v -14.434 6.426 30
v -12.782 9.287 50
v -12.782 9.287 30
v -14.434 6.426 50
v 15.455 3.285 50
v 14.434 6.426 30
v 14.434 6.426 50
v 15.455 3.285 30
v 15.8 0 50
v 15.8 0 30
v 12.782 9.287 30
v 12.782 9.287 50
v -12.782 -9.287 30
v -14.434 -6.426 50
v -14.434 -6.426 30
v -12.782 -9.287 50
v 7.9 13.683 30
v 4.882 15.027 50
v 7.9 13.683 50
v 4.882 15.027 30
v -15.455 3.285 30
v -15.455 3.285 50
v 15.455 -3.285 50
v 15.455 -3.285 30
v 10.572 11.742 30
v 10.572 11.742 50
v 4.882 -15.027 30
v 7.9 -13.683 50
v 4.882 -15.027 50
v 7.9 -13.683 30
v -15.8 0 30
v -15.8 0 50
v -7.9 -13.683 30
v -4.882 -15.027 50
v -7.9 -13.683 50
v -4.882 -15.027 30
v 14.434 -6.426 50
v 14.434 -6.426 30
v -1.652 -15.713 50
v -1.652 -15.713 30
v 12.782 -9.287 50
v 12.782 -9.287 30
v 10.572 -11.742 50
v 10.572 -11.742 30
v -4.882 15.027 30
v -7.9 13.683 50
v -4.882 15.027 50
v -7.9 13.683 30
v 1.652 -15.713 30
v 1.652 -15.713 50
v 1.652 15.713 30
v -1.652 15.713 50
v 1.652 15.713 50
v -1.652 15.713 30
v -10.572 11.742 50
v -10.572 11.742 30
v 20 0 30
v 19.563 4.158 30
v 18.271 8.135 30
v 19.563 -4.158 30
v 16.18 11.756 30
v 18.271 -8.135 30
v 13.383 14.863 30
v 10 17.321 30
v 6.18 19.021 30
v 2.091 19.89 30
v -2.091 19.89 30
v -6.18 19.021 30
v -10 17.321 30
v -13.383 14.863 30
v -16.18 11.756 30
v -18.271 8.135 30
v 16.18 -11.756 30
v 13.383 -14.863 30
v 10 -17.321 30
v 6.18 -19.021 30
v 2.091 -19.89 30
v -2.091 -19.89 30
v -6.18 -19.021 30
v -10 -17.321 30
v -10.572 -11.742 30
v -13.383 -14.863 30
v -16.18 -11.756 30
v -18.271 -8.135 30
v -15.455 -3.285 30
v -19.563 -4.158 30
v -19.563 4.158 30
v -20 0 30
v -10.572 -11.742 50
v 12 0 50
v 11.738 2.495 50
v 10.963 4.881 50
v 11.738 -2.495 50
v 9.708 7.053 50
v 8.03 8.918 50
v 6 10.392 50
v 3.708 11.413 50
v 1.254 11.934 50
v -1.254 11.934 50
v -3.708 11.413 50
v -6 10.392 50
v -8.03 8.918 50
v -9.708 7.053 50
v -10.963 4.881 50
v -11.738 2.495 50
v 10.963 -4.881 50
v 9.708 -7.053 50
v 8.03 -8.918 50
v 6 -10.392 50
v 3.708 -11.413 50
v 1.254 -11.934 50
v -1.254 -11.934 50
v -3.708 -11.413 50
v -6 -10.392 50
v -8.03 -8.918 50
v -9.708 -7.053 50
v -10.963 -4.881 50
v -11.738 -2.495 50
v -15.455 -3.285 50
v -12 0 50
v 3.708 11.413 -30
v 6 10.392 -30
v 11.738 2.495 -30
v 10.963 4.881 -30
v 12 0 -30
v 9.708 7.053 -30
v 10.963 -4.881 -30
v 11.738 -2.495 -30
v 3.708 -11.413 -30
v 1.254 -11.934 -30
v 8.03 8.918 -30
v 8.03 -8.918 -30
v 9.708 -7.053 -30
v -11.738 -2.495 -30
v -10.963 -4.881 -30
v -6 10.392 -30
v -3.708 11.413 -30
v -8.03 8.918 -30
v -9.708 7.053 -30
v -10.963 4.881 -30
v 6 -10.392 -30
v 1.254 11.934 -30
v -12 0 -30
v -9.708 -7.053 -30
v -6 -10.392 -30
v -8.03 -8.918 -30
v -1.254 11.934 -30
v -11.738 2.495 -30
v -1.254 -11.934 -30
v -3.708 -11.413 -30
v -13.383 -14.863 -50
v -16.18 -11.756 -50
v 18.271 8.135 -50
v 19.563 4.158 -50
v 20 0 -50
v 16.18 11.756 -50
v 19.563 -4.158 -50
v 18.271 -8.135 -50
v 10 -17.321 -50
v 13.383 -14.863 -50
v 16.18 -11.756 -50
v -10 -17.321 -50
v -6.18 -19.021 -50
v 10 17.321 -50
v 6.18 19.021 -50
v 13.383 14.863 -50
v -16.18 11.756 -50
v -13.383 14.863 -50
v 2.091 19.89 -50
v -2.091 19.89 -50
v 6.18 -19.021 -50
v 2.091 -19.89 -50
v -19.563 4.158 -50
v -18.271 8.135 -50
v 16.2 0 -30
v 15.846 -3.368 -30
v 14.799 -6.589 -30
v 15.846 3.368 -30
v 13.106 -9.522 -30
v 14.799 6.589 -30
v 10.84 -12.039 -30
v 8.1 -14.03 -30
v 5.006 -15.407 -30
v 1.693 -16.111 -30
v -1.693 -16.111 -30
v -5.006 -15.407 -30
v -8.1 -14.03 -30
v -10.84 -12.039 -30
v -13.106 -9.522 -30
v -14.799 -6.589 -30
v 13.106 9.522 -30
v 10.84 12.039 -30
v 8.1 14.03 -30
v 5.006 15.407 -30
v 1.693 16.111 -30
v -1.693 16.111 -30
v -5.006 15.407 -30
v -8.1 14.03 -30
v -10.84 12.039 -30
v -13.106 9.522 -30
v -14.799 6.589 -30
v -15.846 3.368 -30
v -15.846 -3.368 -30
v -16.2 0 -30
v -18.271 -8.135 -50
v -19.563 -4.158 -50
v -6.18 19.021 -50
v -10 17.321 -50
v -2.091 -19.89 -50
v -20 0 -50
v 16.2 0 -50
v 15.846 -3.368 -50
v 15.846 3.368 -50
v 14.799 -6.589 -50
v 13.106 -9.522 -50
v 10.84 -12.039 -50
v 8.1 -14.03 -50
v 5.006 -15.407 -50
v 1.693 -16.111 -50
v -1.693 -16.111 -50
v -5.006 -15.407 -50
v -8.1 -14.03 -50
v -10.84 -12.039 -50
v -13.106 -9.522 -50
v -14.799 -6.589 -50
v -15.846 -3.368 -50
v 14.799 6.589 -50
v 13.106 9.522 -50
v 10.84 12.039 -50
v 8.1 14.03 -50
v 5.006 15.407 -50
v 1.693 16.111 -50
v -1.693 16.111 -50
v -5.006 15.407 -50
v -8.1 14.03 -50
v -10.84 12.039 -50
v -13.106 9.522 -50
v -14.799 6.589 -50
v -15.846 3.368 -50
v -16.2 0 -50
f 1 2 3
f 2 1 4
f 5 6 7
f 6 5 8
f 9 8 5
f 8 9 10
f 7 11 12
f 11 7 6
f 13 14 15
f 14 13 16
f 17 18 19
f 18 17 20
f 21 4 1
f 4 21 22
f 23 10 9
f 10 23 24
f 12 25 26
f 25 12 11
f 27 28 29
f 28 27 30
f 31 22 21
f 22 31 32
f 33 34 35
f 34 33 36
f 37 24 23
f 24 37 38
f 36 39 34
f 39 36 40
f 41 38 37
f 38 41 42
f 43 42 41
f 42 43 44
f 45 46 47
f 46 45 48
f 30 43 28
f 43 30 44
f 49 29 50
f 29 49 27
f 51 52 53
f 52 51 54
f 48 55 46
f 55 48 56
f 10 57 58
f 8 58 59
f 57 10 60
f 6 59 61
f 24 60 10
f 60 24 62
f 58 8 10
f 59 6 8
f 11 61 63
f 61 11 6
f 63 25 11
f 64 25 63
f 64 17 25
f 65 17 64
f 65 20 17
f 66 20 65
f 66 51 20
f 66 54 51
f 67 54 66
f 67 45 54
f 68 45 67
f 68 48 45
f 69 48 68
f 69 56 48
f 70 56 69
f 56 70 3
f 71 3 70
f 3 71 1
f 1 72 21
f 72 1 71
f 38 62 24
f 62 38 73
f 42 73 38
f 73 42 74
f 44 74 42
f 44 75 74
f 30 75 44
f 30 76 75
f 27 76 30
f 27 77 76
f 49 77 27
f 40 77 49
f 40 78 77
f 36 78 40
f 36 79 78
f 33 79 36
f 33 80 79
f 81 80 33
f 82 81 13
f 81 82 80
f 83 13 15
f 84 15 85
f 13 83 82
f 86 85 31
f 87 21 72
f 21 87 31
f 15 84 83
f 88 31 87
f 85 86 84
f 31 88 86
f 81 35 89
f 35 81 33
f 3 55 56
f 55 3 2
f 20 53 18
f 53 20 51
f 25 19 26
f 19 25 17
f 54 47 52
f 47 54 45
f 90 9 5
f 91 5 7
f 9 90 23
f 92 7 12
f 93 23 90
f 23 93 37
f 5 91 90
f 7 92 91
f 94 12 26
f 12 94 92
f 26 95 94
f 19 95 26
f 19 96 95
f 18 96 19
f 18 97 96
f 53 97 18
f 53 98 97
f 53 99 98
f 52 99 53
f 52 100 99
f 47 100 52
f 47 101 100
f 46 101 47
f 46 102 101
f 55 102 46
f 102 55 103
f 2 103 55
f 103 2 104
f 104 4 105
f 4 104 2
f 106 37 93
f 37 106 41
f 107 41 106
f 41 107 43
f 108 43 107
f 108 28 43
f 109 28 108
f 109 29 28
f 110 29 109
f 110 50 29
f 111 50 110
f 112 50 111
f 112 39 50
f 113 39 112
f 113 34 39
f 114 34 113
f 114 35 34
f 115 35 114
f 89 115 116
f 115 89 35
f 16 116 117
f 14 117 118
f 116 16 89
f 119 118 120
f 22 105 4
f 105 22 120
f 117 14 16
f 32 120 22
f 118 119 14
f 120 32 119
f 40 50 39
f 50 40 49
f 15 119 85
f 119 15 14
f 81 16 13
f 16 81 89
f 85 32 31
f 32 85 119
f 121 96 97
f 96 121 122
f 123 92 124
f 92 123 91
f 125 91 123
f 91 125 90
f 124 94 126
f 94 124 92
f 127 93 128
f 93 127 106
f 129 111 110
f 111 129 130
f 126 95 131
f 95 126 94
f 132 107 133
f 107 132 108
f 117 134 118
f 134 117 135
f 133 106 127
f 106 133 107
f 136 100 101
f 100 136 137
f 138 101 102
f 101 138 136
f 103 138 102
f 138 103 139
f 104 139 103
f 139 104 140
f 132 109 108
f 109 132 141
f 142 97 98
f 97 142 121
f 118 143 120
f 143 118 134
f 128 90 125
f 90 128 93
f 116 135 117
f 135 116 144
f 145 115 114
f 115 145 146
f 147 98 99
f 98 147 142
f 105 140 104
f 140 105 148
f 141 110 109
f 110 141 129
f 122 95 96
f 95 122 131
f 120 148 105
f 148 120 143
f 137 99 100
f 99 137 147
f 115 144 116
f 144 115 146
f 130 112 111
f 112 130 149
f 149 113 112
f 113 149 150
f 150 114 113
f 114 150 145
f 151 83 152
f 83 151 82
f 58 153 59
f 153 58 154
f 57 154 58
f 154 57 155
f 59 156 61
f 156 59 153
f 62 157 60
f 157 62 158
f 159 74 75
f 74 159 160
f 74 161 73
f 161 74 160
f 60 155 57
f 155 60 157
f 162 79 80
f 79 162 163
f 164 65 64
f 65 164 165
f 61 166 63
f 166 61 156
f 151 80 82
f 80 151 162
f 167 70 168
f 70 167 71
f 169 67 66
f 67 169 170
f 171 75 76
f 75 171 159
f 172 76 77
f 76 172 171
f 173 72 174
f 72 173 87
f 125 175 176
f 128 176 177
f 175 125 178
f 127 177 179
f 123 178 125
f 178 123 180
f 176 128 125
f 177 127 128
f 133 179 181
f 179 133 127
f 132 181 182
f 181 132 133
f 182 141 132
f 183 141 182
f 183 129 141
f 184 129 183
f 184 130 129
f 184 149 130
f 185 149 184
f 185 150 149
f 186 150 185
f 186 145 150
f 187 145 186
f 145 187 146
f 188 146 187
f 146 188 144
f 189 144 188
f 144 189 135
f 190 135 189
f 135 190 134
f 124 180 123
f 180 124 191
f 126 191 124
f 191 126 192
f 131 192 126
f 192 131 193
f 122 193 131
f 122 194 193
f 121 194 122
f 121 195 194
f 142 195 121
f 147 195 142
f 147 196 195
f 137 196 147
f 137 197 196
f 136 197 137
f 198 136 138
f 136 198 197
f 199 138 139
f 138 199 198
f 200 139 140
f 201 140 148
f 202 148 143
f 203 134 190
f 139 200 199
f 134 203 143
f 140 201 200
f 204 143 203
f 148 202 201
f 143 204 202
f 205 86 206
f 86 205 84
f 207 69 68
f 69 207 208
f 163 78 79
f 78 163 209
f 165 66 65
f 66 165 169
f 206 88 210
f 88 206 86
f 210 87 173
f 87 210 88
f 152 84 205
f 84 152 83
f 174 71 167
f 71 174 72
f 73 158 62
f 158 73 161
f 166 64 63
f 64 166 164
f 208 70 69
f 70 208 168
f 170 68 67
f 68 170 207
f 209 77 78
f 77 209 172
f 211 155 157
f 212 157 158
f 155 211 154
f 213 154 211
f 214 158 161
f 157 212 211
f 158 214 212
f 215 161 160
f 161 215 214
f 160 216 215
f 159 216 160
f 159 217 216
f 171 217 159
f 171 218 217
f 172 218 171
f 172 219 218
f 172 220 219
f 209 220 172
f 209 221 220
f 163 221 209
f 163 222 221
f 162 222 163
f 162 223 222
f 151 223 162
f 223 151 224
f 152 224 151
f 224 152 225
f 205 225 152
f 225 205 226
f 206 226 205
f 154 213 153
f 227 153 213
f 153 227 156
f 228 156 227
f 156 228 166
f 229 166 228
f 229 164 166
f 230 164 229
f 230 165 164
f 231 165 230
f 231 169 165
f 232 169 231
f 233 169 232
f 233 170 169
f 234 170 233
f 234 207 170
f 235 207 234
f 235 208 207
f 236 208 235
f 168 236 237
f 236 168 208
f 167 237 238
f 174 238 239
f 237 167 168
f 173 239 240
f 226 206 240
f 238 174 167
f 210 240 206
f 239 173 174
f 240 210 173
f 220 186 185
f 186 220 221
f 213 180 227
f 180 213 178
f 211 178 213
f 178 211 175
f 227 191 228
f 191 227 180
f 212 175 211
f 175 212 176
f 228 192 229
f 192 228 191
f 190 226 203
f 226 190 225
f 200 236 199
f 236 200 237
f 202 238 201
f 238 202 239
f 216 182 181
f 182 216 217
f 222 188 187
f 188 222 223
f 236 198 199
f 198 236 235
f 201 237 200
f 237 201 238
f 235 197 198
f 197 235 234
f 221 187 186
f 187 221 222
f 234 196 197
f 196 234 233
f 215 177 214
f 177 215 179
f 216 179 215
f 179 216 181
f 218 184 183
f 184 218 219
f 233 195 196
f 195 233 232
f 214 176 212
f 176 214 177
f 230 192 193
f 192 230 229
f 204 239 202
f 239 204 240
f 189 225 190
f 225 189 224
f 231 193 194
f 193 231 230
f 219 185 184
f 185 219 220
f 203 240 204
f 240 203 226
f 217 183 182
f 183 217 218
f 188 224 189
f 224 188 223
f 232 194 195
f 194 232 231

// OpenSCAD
pipeType = "straightPipe"; //[angledPipe:Right Angle Pipe, straightPipe:Straight Pipe, pipeConverter:Pipe Converter, pipeValve:Pipe Valve, halfPipe:Half Pipe]

/* [ Global ] */

//pipeProfile = "Round" //[]

totalPipeLength = 100;
pipeDiameter = 20;
pipeWallThickness = 8;

topPushFitLength = totalPipeLength*0.2;
bottomPushFitLength = totalPipeLength*0.2;

/* [ Angled Pipe ] */

angleDegrees = 90;

/* [ Converter Pipe ] */

upperDiameter = 50;
lowerDiameter = 20;


/* [ Advanced ] */


fitGapTolerance = 0.4;

topFitWallThickness = 4;
bottomFitWallThickness = 4;

overlap = 0.1;


//Responsible for generating the correct pipe based upon user selection
module thePlumber(){
    
//    lowerPushFit(pipeDiameter);
 
    
    if(pipeType == "straightPipe"){
        straightPipe();
    }
    if(pipeType == "angledPipe"){
        angledPipe();
    }
    if(pipeType == "pipeConverter"){
        pipeSizeConverter();
    }
    if(pipeType == "pipeValve"){
        pipeValve();
    }
    if(pipeType == "halfPipe"){
        halfPipe();
    }
}

module hollowCylinder(h, r1, r2, wallThickness, center){
        //Tests if center has been declaired, if it has not then default is false
        if(center == undef){
            center = false;
        }
        
        
        difference(){
            cylinder(h, r1, r2, center);
            translate([0,0,-0.1]){
                cylinder(h+2, r1-wallThickness, r2-wallThickness, center);
            }
        }
    }


module twoDHollowCircle(r1, r2, wallThickness){
    difference(){
        circle(r1, r2);
        circle(r1-wallThickness, r2-wallThickness);
    }
}

module lowerPushFit(diameter){
    
    if(diameter == undef){diameter = pipeDiameter;}
    
    hollowCylinder(
    bottomPushFitLength, 
    diameter,
    diameter,
    pipeWallThickness-bottomFitWallThickness-fitGapTolerance/2,
    false);
}



module upperPushFit(diameter){

    if(diameter == undef){diameter = pipeDiameter;}

    hollowCylinder(topPushFitLength, 
    diameter-bottomFitWallThickness-fitGapTolerance/2,
    diameter-bottomFitWallThickness-fitGapTolerance/2,
    pipeWallThickness-bottomFitWallThickness-fitGapTolerance/2,
    false
    );
}


module straightPipe(){
    
    inPipeLength = totalPipeLength-topPushFitLength-bottomPushFitLength;
    
    translate([0,0,inPipeLength/2]){
        upperPushFit(pipeDiameter);}
        
    hollowCylinder(inPipeLength,
    pipeDiameter, pipeDiameter, pipeWallThickness, true);
    
    translate([0, 0, -1*(inPipeLength/2)-bottomPushFitLength]){
        rotate([180,0,0]);
        lowerPushFit(pipeDiameter);}
}

module angledPipe(){
//    hollowCylinder(totalPipeLength*0.2, pipeDiameter, pipeDiameter, pipeWallThickness, false);
        rotate_extrude(angle=90, convexity=10)
        translate([20,0,0])
        twoDHollowCircle(pipeDiameter, pipeDiameter, pipeWallThickness);
   
}

module pipeSizeConverter(){
    hollowCylinder(totalPipeLength*0.6, lowerDiameter, upperDiameter, pipeWallThickness);
    
    translate([0,0,-bottomPushFitLength]){lowerPushFit(lowerDiameter);}
    translate([0,0,totalPipeLength*0.6]){upperPushFit(upperDiameter);}

}

module pipeValve(){
    
}


module halfPipe(){
    
}

thePlumber();
